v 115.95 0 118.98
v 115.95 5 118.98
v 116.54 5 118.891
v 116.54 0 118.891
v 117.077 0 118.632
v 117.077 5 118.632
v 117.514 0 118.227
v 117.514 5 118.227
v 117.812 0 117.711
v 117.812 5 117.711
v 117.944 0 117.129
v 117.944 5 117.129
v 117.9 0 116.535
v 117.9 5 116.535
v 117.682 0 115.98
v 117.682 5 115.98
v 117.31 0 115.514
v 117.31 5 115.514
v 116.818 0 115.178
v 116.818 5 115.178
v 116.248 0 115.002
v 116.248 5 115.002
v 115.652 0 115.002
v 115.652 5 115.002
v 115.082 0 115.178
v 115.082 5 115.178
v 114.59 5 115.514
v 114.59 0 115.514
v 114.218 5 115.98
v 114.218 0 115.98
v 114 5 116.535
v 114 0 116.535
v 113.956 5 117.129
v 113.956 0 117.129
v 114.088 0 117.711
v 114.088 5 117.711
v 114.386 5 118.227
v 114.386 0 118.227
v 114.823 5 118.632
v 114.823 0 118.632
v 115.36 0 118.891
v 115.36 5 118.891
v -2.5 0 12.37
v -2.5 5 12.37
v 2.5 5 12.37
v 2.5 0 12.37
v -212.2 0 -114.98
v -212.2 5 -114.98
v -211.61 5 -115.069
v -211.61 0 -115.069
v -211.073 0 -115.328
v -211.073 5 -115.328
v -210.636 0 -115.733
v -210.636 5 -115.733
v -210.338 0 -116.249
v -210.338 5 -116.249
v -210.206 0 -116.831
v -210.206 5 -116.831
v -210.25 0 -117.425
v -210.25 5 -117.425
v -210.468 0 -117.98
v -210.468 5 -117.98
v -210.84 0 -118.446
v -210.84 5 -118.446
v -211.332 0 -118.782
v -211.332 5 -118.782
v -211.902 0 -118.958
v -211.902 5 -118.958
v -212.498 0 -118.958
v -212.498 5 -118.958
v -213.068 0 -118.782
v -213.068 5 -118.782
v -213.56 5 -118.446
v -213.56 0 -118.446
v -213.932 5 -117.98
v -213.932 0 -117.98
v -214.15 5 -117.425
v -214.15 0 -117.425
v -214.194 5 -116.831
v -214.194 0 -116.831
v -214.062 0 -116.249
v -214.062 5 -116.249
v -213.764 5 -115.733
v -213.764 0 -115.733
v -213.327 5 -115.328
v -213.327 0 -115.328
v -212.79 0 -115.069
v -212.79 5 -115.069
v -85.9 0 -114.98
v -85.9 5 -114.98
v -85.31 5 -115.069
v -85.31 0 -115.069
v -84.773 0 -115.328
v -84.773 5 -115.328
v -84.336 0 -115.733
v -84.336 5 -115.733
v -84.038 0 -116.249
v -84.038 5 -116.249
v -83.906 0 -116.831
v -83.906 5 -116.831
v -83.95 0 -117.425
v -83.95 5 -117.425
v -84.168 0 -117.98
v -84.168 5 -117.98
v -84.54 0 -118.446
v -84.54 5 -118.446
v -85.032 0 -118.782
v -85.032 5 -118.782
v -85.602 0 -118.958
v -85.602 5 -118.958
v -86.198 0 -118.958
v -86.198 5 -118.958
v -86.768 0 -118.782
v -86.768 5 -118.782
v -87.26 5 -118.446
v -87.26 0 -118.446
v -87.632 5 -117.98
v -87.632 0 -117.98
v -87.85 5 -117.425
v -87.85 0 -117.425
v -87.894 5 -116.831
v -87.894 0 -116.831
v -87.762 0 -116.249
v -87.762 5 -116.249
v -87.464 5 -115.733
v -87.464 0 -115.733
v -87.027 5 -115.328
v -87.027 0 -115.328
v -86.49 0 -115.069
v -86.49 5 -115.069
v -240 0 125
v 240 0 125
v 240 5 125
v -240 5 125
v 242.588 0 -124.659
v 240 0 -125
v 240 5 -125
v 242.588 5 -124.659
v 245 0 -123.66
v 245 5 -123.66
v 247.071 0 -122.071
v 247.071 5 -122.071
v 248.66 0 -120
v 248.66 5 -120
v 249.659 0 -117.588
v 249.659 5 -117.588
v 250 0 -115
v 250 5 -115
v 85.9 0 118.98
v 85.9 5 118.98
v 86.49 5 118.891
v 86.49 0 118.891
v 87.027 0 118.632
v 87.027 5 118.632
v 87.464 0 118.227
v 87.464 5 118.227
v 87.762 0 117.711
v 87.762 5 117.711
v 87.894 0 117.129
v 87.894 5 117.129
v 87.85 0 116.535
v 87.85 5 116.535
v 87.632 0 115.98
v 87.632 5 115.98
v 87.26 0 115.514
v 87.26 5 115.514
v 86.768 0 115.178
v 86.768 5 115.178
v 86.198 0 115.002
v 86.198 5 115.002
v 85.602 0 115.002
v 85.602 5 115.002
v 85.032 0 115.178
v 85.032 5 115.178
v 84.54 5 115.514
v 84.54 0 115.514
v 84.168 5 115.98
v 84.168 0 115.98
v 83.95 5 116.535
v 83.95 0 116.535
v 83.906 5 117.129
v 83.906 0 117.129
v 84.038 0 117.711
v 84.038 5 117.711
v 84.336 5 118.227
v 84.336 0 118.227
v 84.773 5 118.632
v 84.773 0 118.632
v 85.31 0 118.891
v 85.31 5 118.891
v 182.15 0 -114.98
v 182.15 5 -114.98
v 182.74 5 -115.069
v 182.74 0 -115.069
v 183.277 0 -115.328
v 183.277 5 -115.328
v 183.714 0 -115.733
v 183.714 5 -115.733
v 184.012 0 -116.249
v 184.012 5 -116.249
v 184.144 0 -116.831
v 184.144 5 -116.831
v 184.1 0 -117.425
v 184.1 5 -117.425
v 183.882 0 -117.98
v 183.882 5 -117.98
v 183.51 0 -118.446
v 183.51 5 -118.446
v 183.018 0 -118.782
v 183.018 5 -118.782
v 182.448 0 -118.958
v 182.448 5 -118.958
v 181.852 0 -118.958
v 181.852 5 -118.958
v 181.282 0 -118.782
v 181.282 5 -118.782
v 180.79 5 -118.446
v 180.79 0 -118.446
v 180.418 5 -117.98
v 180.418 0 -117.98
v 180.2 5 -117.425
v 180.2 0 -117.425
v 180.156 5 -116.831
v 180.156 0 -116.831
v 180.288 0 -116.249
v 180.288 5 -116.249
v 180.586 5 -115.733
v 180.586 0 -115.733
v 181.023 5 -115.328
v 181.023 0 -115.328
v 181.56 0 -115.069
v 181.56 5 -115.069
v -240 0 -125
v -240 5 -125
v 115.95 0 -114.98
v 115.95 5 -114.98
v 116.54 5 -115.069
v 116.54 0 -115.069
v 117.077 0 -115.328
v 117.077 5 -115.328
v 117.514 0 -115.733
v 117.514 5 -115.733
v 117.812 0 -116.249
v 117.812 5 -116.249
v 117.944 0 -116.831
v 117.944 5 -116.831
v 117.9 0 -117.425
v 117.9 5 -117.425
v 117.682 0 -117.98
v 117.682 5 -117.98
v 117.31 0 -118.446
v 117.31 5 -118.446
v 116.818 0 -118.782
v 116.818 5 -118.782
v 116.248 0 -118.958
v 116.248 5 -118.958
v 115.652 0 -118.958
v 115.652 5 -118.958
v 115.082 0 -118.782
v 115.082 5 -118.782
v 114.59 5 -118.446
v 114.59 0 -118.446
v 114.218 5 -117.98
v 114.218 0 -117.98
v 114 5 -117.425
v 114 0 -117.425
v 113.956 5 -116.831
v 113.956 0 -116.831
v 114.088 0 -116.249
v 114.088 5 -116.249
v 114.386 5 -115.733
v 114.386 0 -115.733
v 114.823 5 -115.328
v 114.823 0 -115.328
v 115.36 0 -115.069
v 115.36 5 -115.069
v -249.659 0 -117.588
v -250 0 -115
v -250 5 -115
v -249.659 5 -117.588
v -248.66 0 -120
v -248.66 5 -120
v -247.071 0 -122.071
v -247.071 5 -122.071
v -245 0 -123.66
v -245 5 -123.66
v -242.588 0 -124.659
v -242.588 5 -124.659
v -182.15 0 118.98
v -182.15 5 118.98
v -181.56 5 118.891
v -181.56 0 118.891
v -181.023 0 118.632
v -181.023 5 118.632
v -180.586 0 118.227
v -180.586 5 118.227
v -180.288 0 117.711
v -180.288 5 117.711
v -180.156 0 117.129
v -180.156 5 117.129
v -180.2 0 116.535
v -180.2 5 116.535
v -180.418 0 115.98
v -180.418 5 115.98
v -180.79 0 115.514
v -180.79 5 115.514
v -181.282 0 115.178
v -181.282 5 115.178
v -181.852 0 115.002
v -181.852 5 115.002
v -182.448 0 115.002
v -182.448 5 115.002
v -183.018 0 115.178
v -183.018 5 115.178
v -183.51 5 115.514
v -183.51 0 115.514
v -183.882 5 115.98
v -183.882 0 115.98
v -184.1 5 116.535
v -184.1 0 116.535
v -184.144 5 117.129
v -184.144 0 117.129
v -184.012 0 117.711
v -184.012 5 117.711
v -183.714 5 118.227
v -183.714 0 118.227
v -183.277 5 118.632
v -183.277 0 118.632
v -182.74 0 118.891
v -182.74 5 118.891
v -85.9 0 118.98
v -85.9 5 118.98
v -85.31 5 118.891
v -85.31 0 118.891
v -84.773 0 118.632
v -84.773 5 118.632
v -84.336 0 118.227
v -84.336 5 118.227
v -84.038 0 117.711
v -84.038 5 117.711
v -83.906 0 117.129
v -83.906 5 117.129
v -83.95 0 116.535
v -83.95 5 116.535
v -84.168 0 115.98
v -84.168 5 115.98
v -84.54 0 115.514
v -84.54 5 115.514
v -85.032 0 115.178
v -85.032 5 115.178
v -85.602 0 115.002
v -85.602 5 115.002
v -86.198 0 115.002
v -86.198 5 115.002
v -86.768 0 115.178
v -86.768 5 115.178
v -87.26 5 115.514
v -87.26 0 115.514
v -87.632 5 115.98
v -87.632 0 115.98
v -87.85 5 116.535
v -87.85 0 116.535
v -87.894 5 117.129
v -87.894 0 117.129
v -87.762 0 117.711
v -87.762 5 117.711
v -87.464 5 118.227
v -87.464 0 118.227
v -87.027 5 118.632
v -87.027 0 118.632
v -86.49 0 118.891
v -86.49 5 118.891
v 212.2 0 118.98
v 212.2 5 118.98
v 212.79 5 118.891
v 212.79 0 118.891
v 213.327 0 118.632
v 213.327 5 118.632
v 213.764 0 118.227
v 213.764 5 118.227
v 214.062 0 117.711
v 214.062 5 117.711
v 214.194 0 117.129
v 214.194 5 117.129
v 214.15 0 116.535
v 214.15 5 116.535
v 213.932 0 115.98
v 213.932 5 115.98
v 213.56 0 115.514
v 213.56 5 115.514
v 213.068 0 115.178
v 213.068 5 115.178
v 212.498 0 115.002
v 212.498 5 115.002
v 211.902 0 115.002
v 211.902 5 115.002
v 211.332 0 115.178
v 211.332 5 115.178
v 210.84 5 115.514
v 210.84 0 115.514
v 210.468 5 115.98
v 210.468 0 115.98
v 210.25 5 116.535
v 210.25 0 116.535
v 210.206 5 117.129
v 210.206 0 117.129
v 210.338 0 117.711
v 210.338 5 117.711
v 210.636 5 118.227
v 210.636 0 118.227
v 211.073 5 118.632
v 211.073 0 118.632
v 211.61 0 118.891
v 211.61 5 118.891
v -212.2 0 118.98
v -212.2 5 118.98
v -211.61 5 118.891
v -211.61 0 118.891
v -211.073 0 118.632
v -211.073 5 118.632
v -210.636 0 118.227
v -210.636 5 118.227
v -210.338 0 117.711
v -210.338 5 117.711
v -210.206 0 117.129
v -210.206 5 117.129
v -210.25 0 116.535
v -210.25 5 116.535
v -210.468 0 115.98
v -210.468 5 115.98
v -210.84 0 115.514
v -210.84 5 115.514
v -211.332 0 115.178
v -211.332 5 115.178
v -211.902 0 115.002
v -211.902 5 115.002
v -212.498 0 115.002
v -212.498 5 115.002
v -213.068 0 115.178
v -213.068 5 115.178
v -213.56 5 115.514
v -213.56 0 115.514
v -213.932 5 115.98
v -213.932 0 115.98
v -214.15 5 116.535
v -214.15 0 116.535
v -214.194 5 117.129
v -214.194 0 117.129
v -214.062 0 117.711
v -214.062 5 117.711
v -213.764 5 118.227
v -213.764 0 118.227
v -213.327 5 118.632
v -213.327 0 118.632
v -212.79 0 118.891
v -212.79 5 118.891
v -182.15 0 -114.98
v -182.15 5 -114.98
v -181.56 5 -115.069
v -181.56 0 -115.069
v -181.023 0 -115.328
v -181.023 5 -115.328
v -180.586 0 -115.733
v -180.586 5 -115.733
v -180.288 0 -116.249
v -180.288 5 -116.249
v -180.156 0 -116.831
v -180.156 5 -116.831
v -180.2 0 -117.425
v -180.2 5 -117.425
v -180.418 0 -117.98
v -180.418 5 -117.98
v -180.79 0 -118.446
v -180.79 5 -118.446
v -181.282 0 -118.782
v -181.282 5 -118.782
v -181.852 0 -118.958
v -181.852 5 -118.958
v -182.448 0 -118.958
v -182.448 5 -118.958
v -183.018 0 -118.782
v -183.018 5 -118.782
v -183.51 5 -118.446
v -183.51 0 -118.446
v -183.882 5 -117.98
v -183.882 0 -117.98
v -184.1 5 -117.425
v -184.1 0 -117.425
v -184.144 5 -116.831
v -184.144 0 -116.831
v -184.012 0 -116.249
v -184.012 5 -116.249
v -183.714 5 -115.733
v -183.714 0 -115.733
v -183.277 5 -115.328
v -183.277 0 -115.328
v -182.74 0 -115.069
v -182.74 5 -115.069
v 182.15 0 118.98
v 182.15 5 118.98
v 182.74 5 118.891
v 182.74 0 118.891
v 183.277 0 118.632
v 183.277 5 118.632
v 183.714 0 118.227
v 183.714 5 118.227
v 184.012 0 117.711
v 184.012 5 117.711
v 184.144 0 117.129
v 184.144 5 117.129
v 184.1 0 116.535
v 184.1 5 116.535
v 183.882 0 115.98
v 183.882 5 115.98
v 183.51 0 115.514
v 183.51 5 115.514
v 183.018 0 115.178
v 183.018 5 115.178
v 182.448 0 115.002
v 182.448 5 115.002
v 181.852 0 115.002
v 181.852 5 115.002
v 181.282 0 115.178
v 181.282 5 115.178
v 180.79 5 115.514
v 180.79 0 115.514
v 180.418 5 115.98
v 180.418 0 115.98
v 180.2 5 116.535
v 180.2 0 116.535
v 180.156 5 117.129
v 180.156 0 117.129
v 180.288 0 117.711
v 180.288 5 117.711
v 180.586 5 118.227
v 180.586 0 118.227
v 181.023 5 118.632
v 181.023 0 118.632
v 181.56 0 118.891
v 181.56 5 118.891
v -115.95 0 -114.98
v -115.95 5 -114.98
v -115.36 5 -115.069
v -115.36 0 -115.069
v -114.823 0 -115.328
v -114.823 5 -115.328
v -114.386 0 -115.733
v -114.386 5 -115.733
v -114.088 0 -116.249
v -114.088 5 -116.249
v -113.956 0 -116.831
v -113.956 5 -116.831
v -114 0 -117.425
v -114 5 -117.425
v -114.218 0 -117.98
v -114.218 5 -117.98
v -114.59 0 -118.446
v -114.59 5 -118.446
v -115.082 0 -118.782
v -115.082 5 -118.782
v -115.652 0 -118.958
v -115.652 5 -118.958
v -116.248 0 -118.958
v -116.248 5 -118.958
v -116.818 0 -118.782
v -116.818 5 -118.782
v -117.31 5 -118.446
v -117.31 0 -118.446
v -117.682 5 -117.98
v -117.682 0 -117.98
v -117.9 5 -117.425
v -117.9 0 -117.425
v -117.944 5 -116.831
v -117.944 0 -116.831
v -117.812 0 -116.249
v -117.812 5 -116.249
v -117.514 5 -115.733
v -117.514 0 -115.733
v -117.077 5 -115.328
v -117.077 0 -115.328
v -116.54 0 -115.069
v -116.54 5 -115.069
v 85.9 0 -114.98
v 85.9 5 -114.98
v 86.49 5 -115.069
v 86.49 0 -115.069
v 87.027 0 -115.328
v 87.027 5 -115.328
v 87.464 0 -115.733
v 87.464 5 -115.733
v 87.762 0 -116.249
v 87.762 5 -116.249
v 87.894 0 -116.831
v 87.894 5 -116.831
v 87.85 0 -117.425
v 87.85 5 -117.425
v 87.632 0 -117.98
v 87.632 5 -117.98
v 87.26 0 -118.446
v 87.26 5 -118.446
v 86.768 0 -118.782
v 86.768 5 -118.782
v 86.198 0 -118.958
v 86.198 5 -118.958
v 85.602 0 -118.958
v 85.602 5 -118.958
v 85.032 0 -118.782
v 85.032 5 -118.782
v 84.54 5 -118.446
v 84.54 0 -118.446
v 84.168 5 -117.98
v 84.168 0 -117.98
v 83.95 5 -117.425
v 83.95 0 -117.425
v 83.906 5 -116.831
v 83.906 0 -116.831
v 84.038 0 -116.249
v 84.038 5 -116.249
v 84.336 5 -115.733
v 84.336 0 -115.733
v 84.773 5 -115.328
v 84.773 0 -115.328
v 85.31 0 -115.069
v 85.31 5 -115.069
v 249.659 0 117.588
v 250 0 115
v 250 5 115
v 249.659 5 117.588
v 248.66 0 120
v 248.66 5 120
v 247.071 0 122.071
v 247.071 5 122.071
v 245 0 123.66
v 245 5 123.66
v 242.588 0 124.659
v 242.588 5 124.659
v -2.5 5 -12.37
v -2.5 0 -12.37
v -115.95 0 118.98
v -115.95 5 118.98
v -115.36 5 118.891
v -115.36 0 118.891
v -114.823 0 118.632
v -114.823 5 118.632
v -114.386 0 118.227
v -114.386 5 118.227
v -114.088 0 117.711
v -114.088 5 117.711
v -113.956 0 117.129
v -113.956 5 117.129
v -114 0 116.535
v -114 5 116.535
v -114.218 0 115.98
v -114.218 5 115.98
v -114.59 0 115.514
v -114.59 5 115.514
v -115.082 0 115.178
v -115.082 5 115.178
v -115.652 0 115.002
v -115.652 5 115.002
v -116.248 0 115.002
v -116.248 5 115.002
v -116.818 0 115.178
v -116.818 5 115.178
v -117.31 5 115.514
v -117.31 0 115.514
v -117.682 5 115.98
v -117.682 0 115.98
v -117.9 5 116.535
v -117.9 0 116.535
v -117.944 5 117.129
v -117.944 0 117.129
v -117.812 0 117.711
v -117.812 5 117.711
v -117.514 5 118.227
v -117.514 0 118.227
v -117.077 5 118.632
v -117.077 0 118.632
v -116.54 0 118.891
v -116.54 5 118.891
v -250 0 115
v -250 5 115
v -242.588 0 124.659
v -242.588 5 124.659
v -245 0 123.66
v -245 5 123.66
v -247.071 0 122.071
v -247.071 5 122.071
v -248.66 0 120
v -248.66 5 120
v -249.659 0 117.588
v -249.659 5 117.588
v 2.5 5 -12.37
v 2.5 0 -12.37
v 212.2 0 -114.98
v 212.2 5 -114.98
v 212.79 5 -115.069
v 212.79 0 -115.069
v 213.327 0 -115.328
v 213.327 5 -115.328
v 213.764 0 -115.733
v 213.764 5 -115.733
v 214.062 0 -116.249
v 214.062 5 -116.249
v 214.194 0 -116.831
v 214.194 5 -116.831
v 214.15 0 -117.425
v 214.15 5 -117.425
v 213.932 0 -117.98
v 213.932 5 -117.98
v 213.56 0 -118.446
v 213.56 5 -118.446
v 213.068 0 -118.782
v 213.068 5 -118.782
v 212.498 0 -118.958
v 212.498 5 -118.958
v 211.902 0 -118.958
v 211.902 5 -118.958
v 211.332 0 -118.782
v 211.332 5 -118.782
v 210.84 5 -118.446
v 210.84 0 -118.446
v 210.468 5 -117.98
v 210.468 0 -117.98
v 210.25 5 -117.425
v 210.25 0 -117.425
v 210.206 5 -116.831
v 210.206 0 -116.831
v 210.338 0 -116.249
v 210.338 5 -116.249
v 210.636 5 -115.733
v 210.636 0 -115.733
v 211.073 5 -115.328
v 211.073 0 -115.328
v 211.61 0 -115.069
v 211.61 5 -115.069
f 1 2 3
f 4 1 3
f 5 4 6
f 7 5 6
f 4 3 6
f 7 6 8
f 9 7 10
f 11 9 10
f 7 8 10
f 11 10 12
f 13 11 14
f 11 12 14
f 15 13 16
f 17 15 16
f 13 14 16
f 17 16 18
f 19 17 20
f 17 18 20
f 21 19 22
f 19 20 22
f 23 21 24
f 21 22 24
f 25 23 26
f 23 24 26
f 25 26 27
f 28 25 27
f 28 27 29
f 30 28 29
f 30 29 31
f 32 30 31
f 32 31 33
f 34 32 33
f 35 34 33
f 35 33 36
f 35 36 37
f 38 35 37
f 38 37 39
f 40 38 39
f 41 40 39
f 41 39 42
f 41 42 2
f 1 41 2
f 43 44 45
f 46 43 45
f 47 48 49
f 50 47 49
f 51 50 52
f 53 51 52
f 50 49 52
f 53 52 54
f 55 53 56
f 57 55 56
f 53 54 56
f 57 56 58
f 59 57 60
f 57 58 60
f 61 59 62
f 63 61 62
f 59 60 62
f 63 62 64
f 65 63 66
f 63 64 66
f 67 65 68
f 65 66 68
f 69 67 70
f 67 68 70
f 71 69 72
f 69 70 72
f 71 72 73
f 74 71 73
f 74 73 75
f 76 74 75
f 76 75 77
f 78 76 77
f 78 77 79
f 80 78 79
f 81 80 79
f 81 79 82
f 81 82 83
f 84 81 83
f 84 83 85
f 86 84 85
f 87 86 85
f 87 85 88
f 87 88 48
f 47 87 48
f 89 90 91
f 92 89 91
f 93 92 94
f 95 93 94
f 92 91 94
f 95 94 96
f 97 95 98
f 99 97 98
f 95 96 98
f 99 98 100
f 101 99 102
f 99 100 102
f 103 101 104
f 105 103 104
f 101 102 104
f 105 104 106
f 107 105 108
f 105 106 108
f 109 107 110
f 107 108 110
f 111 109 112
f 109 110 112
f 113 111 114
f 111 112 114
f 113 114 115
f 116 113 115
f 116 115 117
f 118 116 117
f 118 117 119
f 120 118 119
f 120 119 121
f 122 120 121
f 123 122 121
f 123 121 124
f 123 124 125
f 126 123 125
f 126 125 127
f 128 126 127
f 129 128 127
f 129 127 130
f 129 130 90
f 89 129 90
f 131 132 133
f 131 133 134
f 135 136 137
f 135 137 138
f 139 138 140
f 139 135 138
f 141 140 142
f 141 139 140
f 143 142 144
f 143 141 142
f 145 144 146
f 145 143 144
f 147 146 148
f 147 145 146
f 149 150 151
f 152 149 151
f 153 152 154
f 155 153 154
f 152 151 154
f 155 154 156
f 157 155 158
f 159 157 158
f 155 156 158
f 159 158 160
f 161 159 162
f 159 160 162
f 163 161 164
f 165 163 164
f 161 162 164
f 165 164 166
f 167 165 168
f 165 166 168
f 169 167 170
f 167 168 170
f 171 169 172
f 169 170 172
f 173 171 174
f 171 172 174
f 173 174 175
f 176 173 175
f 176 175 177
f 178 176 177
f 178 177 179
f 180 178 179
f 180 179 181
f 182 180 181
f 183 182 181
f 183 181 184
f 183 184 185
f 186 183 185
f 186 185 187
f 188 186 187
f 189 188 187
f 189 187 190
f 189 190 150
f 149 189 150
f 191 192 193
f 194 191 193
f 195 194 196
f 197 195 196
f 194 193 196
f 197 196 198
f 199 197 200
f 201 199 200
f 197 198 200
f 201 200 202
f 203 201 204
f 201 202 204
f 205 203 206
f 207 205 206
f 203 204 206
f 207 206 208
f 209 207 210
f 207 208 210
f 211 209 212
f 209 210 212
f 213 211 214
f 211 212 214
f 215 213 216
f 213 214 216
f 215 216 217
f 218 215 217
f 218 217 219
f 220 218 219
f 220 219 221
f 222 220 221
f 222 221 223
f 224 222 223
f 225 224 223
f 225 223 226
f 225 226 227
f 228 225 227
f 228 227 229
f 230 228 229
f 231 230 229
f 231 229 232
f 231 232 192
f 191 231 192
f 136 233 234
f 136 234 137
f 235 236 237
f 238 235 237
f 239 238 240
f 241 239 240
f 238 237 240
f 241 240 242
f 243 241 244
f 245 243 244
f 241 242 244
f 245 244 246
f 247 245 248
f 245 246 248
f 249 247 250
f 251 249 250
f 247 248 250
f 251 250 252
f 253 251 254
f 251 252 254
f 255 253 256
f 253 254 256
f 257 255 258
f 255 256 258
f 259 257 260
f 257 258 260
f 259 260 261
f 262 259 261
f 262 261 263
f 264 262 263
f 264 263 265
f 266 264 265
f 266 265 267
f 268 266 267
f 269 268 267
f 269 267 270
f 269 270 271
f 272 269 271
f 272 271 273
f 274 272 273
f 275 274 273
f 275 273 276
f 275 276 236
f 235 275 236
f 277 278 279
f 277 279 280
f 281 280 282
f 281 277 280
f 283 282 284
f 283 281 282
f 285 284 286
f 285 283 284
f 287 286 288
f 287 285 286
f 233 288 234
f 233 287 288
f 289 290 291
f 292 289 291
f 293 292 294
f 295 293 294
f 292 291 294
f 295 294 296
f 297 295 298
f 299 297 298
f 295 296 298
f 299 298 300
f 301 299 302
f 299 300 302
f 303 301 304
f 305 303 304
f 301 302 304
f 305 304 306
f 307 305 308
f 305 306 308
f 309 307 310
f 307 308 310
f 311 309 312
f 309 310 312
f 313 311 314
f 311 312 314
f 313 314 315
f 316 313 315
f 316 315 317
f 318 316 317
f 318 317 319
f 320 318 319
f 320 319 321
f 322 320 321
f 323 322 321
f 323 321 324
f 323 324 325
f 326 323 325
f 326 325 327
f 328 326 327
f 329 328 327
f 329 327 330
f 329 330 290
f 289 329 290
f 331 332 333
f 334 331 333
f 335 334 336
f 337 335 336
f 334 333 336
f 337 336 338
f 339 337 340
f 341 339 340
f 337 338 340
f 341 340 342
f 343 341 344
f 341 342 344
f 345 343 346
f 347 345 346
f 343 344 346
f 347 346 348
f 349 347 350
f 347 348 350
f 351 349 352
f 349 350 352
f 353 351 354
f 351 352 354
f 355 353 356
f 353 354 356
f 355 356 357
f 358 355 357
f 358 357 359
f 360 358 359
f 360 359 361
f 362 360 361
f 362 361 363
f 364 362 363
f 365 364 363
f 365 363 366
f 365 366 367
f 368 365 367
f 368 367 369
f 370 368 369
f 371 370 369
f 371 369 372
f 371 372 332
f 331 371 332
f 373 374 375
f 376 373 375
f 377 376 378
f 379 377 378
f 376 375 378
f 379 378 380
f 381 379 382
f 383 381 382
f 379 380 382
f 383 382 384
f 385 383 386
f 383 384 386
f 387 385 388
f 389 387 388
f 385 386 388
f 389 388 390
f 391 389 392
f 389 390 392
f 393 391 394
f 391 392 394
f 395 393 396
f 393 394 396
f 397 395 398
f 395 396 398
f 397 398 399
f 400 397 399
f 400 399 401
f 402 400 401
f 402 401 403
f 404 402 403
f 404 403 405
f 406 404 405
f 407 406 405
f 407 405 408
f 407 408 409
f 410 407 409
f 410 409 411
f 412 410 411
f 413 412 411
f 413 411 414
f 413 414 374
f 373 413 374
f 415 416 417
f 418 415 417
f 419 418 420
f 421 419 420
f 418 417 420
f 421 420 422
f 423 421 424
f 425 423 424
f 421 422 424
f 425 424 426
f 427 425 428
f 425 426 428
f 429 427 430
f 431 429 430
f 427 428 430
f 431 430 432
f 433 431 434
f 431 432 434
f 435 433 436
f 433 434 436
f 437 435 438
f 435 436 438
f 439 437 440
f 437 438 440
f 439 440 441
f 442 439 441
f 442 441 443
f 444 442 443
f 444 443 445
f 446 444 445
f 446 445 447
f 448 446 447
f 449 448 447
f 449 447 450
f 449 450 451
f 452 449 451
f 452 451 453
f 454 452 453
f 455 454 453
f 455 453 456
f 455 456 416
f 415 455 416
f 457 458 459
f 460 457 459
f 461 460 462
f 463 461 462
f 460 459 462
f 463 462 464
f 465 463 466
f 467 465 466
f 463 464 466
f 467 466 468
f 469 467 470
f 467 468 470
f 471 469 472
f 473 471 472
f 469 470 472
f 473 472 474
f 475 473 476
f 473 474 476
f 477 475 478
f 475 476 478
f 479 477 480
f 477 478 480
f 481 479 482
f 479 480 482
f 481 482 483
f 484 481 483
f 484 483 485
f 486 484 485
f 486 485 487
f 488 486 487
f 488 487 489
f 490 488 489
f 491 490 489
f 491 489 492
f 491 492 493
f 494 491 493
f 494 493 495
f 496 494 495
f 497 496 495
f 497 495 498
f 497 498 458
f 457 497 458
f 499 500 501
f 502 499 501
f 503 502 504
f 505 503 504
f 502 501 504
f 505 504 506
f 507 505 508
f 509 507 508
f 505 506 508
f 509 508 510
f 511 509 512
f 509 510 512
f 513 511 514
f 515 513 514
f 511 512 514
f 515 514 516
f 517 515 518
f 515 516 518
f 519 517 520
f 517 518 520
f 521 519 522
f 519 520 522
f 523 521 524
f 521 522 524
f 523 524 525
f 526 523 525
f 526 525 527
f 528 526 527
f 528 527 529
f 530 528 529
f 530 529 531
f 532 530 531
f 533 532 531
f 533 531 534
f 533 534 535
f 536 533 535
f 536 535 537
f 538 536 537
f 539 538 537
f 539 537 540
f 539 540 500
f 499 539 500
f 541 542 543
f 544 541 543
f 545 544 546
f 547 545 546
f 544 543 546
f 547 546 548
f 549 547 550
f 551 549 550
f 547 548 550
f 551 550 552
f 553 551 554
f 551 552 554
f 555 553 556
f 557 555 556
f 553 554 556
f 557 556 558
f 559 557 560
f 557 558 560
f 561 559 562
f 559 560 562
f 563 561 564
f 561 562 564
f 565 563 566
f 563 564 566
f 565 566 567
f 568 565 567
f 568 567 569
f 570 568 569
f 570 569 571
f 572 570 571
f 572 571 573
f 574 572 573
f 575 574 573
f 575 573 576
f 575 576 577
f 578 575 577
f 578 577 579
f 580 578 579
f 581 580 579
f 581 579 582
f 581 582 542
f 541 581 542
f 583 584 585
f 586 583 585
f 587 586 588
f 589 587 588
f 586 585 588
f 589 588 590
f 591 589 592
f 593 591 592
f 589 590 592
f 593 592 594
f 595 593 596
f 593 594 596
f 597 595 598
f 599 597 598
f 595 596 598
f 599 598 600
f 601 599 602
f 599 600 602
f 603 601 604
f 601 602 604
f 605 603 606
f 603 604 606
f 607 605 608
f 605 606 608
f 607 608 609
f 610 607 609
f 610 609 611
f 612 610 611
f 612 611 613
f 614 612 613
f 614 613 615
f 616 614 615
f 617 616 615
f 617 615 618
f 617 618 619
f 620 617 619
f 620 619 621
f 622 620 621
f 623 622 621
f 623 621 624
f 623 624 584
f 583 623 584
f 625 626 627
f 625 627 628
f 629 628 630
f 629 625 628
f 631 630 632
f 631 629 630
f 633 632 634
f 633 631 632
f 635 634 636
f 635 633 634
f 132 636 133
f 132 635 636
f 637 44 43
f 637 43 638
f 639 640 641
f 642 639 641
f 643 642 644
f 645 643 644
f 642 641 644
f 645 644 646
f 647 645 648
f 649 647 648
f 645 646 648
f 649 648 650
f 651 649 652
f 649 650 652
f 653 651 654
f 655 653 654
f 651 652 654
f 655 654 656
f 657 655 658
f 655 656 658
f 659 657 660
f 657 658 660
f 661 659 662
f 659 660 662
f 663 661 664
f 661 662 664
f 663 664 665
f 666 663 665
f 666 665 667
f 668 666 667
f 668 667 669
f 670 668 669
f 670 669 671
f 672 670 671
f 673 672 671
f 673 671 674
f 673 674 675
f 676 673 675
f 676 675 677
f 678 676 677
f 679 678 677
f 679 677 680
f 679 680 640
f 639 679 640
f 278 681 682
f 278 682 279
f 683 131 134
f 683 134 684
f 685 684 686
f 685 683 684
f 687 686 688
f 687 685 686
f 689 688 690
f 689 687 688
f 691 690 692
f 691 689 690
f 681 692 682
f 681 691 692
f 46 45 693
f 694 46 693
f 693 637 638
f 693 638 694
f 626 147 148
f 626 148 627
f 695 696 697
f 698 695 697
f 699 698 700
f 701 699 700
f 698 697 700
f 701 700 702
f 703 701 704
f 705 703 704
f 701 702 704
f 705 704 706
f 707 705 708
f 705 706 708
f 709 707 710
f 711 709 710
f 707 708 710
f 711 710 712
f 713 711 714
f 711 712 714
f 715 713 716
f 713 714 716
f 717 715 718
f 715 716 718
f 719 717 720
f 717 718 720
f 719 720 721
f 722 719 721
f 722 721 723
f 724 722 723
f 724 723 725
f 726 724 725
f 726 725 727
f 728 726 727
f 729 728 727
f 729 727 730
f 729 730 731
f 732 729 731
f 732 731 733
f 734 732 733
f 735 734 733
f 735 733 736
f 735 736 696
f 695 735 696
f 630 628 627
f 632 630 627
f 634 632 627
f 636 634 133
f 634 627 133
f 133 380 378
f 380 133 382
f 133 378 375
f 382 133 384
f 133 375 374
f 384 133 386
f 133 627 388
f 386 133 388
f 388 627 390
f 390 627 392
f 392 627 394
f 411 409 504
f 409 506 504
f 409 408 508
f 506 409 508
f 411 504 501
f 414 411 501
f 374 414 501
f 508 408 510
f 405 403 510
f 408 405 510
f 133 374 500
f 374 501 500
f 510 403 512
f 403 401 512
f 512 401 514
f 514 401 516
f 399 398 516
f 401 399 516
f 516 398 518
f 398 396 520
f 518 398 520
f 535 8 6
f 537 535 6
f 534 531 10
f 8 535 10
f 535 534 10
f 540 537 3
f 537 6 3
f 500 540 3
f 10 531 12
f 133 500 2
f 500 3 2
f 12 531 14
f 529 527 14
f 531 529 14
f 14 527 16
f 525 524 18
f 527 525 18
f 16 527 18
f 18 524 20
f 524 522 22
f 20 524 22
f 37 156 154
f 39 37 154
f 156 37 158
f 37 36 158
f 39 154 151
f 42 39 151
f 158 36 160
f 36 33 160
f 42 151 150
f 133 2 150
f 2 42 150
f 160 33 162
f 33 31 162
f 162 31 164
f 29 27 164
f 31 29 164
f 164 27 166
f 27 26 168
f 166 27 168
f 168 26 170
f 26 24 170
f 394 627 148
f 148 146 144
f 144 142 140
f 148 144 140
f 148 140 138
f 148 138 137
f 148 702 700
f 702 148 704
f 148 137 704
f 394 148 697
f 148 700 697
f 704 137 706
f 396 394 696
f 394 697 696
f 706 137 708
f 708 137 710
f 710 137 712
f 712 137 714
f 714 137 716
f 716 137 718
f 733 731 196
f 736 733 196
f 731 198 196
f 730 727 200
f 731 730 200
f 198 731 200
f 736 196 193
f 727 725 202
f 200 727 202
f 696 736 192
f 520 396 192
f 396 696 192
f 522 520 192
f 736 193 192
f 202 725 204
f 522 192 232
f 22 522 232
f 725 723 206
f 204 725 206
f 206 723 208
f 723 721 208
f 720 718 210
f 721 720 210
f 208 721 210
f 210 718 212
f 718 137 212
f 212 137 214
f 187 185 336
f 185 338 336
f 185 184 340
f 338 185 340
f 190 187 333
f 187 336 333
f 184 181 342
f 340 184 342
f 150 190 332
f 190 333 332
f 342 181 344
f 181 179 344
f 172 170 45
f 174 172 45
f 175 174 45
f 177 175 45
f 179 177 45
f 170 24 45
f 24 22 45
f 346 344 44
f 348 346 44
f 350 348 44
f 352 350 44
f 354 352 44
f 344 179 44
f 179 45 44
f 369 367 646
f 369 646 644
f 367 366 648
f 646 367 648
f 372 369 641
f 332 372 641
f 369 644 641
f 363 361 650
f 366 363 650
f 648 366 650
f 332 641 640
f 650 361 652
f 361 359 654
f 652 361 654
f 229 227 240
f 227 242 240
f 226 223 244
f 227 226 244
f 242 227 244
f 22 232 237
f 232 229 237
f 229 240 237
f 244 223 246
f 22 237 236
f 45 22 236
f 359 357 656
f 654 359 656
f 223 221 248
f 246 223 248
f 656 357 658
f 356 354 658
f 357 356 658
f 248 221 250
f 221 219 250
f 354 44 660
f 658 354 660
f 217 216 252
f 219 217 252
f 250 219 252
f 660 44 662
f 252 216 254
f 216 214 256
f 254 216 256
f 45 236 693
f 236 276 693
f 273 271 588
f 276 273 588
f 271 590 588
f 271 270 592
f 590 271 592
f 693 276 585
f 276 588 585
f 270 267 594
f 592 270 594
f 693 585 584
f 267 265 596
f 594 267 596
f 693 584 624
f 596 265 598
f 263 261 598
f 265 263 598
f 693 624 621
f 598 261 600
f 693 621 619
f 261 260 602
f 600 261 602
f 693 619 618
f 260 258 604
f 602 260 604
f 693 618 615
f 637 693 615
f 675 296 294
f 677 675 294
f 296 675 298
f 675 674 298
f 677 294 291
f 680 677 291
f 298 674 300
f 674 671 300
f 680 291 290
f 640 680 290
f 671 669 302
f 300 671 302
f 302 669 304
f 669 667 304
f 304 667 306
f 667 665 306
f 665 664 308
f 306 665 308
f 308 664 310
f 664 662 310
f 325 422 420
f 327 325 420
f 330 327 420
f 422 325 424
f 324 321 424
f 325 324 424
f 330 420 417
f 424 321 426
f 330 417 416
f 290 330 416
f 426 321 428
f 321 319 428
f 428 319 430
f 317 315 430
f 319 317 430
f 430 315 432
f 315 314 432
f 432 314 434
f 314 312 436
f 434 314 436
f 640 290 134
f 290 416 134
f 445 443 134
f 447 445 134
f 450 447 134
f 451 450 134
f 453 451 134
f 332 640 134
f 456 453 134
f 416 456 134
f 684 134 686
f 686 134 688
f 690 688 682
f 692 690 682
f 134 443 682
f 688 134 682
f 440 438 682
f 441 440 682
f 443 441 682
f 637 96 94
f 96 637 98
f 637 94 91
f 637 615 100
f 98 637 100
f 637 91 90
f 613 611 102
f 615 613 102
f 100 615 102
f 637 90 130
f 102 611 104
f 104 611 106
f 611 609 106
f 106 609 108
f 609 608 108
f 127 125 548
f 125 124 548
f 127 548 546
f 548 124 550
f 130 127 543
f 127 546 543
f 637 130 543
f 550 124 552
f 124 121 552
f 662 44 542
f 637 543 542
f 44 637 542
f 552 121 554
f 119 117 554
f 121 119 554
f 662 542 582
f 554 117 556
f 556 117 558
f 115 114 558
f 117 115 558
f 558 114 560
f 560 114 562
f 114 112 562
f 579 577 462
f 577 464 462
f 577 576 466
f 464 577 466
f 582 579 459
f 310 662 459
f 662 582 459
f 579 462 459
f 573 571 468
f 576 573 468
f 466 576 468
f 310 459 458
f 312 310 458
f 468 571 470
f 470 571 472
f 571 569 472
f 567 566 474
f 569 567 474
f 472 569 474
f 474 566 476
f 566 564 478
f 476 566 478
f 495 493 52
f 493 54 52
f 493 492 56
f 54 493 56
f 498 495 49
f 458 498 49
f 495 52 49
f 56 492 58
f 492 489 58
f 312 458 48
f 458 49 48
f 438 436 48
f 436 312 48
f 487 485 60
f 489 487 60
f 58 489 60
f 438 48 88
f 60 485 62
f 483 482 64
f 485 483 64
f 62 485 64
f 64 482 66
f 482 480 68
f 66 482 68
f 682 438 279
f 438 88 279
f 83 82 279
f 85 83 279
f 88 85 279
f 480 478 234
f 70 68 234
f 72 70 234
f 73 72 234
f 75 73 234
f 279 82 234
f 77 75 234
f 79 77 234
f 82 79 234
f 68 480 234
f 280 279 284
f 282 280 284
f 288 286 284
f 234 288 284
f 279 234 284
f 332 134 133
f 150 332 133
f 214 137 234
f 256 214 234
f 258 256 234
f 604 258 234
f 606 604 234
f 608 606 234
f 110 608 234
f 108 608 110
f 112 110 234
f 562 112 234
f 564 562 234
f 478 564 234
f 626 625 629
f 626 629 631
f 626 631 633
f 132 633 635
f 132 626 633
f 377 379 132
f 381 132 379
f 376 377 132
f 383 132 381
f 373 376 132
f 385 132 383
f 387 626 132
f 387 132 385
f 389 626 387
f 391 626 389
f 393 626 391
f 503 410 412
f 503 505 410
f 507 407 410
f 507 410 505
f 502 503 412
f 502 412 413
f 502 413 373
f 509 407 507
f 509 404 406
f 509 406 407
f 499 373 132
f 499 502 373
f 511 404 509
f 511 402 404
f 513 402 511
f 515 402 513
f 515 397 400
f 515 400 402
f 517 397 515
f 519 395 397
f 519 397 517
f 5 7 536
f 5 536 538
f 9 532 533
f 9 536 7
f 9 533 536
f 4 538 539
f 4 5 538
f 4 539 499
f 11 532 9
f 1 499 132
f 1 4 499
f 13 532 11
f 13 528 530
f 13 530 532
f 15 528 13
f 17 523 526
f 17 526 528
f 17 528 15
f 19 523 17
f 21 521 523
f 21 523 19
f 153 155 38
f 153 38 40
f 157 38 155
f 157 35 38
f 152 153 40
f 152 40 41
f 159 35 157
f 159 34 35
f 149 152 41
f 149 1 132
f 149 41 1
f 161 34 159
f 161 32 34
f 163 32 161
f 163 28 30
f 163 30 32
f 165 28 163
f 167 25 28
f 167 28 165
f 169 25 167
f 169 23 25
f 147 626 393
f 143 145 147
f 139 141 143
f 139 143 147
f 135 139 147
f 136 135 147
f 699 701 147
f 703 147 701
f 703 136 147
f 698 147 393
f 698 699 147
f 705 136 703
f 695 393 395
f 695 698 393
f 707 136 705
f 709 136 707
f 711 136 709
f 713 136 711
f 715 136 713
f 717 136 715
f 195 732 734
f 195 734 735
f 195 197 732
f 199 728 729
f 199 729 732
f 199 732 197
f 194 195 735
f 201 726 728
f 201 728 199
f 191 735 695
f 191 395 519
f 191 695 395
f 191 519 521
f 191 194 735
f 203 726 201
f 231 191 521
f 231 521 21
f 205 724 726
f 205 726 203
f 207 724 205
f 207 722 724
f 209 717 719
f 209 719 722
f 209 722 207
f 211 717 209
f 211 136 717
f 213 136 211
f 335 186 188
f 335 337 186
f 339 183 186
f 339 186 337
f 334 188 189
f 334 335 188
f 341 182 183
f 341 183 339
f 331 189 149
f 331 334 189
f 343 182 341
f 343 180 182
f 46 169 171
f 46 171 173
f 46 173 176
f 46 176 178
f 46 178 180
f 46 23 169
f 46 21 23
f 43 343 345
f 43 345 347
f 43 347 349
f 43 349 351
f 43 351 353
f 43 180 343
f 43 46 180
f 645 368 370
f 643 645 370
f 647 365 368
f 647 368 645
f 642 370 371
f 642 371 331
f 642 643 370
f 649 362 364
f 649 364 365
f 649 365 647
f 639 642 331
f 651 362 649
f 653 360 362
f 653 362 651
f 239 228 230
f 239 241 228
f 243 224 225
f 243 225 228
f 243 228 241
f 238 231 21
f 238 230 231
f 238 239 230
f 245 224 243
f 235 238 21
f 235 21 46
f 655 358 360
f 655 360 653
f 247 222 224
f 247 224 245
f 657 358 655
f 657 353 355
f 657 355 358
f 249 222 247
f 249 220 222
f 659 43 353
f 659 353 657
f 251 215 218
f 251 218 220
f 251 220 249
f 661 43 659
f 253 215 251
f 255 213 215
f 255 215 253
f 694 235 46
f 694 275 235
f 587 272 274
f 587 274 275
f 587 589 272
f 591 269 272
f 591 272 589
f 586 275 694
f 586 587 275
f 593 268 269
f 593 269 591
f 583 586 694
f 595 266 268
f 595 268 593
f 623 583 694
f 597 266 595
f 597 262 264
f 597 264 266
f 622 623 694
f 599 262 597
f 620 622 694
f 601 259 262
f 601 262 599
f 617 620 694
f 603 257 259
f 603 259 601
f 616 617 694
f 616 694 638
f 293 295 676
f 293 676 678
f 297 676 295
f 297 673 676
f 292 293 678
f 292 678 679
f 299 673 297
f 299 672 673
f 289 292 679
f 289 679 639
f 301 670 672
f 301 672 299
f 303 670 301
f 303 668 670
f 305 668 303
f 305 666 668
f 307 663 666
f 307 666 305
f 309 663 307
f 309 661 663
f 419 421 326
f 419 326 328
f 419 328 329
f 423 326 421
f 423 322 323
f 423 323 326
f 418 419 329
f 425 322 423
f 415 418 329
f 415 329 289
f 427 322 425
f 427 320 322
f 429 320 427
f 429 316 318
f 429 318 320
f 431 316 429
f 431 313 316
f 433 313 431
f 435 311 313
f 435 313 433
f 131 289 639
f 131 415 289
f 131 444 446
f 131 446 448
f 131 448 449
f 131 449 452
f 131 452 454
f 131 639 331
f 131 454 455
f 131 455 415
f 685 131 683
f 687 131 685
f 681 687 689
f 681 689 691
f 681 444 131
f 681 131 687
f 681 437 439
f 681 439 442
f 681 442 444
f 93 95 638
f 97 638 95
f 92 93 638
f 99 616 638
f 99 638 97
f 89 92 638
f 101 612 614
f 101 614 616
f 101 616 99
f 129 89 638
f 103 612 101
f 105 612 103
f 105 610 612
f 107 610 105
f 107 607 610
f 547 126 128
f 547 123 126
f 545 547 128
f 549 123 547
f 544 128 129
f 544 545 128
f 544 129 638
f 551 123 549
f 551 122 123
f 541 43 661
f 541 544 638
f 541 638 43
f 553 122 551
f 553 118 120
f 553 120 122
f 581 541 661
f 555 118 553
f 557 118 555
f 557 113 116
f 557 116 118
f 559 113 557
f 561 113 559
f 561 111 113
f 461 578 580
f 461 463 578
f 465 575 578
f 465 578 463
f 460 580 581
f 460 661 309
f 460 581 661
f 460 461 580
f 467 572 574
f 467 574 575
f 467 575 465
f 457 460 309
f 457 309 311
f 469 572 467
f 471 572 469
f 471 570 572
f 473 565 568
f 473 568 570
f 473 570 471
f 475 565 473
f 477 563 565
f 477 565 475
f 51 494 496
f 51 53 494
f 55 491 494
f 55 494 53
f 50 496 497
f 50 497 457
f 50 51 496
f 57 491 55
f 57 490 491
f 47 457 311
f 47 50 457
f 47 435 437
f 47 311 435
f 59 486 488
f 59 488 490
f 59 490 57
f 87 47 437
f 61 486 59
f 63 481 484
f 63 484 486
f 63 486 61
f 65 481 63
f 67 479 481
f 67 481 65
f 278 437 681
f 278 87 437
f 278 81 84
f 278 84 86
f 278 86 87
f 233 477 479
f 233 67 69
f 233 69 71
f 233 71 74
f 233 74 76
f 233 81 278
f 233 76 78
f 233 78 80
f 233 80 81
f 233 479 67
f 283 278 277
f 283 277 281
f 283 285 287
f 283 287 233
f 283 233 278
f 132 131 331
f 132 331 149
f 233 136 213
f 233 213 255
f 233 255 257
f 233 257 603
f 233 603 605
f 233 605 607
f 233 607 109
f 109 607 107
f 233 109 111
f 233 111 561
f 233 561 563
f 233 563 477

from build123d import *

# Parameters (mm, degrees)
SALIENTE_EXTRUIR1_DEPTH = 5
CROQUIS2_R              = 2
CORTAR_EXTRUIR1_DEPTH   = 10
CROQUIS3_W              = 5
CROQUIS3_H              = 24.74
CORTAR_EXTRUIR2_DEPTH   = 10


with BuildPart() as part:
    # Croquis1 → Saliente-Extruir1 (new body)
    with BuildSketch(Plane(origin=(0, 0, 0), x_dir=(1, 0, 0), z_dir=(0, 1, 0))):
        with BuildLine():
            Line((240, -125), (-240, -125))
            ThreePointArc((-240, -125), (-247.071067812, -122.071067812), (-250, -115))
            Line((-250, -115), (-250, 115))
            ThreePointArc((-250, 115), (-247.071067812, 122.071067812), (-240, 125))
            Line((-240, 125), (240, 125))
            ThreePointArc((240, 125), (247.071067812, 122.071067812), (250, 115))
            Line((250, 115), (250, -115))
            ThreePointArc((250, -115), (247.071067812, -122.071067812), (240, -125))
        make_face()
    extrude(amount=SALIENTE_EXTRUIR1_DEPTH)

    # Croquis2 → Cortar-Extruir1 (cut)
    with BuildSketch(Plane(origin=(0, 5, 0), x_dir=(1, 0, 0), z_dir=(0, 1, 0))):
        with Locations(Location((-212.2, -116.98, 0), (0, 0, 270))):
            Circle(CROQUIS2_R)
        with Locations(Location((-182.15, -116.98, 0), (0, 0, 270))):
            Circle(CROQUIS2_R)
        with Locations(Location((-85.9, -116.98, 0), (0, 0, 270))):
            Circle(CROQUIS2_R)
        with Locations(Location((-115.95, -116.98, 0), (0, 0, 270))):
            Circle(CROQUIS2_R)
        with Locations(Location((212.2, -116.98, 0), (0, 0, 270))):
            Circle(CROQUIS2_R)
        with Locations(Location((182.15, -116.98, 0), (0, 0, 270))):
            Circle(CROQUIS2_R)
        with Locations(Location((115.95, -116.98, 0), (0, 0, 270))):
            Circle(CROQUIS2_R)
        with Locations(Location((85.9, -116.98, 0), (0, 0, 270))):
            Circle(CROQUIS2_R)
        with Locations(Location((212.2, 116.98, 0), (0, 0, 270))):
            Circle(CROQUIS2_R)
        with Locations(Location((182.15, 116.98, 0), (0, 0, 270))):
            Circle(CROQUIS2_R)
        with Locations(Location((115.95, 116.98, 0), (0, 0, 270))):
            Circle(CROQUIS2_R)
        with Locations(Location((85.9, 116.98, 0), (0, 0, 270))):
            Circle(CROQUIS2_R)
        with Locations(Location((-182.15, 116.98, 0), (0, 0, 270))):
            Circle(CROQUIS2_R)
        with Locations(Location((-212.2, 116.98, 0), (0, 0, 270))):
            Circle(CROQUIS2_R)
        with Locations(Location((-85.9, 116.98, 0), (0, 0, 270))):
            Circle(CROQUIS2_R)
        with Locations(Location((-115.95, 116.98, 0), (0, 0, 270))):
            Circle(CROQUIS2_R)
    extrude(amount=-CORTAR_EXTRUIR1_DEPTH, mode=Mode.SUBTRACT)

    # Croquis3 → Cortar-Extruir2 (cut)
    with BuildSketch(Plane(origin=(0, 5, 0), x_dir=(1, 0, 0), z_dir=(0, 1, 0))):
        Rectangle(CROQUIS3_W, CROQUIS3_H)
    extrude(amount=-CORTAR_EXTRUIR2_DEPTH, mode=Mode.SUBTRACT)


solid = part.part
